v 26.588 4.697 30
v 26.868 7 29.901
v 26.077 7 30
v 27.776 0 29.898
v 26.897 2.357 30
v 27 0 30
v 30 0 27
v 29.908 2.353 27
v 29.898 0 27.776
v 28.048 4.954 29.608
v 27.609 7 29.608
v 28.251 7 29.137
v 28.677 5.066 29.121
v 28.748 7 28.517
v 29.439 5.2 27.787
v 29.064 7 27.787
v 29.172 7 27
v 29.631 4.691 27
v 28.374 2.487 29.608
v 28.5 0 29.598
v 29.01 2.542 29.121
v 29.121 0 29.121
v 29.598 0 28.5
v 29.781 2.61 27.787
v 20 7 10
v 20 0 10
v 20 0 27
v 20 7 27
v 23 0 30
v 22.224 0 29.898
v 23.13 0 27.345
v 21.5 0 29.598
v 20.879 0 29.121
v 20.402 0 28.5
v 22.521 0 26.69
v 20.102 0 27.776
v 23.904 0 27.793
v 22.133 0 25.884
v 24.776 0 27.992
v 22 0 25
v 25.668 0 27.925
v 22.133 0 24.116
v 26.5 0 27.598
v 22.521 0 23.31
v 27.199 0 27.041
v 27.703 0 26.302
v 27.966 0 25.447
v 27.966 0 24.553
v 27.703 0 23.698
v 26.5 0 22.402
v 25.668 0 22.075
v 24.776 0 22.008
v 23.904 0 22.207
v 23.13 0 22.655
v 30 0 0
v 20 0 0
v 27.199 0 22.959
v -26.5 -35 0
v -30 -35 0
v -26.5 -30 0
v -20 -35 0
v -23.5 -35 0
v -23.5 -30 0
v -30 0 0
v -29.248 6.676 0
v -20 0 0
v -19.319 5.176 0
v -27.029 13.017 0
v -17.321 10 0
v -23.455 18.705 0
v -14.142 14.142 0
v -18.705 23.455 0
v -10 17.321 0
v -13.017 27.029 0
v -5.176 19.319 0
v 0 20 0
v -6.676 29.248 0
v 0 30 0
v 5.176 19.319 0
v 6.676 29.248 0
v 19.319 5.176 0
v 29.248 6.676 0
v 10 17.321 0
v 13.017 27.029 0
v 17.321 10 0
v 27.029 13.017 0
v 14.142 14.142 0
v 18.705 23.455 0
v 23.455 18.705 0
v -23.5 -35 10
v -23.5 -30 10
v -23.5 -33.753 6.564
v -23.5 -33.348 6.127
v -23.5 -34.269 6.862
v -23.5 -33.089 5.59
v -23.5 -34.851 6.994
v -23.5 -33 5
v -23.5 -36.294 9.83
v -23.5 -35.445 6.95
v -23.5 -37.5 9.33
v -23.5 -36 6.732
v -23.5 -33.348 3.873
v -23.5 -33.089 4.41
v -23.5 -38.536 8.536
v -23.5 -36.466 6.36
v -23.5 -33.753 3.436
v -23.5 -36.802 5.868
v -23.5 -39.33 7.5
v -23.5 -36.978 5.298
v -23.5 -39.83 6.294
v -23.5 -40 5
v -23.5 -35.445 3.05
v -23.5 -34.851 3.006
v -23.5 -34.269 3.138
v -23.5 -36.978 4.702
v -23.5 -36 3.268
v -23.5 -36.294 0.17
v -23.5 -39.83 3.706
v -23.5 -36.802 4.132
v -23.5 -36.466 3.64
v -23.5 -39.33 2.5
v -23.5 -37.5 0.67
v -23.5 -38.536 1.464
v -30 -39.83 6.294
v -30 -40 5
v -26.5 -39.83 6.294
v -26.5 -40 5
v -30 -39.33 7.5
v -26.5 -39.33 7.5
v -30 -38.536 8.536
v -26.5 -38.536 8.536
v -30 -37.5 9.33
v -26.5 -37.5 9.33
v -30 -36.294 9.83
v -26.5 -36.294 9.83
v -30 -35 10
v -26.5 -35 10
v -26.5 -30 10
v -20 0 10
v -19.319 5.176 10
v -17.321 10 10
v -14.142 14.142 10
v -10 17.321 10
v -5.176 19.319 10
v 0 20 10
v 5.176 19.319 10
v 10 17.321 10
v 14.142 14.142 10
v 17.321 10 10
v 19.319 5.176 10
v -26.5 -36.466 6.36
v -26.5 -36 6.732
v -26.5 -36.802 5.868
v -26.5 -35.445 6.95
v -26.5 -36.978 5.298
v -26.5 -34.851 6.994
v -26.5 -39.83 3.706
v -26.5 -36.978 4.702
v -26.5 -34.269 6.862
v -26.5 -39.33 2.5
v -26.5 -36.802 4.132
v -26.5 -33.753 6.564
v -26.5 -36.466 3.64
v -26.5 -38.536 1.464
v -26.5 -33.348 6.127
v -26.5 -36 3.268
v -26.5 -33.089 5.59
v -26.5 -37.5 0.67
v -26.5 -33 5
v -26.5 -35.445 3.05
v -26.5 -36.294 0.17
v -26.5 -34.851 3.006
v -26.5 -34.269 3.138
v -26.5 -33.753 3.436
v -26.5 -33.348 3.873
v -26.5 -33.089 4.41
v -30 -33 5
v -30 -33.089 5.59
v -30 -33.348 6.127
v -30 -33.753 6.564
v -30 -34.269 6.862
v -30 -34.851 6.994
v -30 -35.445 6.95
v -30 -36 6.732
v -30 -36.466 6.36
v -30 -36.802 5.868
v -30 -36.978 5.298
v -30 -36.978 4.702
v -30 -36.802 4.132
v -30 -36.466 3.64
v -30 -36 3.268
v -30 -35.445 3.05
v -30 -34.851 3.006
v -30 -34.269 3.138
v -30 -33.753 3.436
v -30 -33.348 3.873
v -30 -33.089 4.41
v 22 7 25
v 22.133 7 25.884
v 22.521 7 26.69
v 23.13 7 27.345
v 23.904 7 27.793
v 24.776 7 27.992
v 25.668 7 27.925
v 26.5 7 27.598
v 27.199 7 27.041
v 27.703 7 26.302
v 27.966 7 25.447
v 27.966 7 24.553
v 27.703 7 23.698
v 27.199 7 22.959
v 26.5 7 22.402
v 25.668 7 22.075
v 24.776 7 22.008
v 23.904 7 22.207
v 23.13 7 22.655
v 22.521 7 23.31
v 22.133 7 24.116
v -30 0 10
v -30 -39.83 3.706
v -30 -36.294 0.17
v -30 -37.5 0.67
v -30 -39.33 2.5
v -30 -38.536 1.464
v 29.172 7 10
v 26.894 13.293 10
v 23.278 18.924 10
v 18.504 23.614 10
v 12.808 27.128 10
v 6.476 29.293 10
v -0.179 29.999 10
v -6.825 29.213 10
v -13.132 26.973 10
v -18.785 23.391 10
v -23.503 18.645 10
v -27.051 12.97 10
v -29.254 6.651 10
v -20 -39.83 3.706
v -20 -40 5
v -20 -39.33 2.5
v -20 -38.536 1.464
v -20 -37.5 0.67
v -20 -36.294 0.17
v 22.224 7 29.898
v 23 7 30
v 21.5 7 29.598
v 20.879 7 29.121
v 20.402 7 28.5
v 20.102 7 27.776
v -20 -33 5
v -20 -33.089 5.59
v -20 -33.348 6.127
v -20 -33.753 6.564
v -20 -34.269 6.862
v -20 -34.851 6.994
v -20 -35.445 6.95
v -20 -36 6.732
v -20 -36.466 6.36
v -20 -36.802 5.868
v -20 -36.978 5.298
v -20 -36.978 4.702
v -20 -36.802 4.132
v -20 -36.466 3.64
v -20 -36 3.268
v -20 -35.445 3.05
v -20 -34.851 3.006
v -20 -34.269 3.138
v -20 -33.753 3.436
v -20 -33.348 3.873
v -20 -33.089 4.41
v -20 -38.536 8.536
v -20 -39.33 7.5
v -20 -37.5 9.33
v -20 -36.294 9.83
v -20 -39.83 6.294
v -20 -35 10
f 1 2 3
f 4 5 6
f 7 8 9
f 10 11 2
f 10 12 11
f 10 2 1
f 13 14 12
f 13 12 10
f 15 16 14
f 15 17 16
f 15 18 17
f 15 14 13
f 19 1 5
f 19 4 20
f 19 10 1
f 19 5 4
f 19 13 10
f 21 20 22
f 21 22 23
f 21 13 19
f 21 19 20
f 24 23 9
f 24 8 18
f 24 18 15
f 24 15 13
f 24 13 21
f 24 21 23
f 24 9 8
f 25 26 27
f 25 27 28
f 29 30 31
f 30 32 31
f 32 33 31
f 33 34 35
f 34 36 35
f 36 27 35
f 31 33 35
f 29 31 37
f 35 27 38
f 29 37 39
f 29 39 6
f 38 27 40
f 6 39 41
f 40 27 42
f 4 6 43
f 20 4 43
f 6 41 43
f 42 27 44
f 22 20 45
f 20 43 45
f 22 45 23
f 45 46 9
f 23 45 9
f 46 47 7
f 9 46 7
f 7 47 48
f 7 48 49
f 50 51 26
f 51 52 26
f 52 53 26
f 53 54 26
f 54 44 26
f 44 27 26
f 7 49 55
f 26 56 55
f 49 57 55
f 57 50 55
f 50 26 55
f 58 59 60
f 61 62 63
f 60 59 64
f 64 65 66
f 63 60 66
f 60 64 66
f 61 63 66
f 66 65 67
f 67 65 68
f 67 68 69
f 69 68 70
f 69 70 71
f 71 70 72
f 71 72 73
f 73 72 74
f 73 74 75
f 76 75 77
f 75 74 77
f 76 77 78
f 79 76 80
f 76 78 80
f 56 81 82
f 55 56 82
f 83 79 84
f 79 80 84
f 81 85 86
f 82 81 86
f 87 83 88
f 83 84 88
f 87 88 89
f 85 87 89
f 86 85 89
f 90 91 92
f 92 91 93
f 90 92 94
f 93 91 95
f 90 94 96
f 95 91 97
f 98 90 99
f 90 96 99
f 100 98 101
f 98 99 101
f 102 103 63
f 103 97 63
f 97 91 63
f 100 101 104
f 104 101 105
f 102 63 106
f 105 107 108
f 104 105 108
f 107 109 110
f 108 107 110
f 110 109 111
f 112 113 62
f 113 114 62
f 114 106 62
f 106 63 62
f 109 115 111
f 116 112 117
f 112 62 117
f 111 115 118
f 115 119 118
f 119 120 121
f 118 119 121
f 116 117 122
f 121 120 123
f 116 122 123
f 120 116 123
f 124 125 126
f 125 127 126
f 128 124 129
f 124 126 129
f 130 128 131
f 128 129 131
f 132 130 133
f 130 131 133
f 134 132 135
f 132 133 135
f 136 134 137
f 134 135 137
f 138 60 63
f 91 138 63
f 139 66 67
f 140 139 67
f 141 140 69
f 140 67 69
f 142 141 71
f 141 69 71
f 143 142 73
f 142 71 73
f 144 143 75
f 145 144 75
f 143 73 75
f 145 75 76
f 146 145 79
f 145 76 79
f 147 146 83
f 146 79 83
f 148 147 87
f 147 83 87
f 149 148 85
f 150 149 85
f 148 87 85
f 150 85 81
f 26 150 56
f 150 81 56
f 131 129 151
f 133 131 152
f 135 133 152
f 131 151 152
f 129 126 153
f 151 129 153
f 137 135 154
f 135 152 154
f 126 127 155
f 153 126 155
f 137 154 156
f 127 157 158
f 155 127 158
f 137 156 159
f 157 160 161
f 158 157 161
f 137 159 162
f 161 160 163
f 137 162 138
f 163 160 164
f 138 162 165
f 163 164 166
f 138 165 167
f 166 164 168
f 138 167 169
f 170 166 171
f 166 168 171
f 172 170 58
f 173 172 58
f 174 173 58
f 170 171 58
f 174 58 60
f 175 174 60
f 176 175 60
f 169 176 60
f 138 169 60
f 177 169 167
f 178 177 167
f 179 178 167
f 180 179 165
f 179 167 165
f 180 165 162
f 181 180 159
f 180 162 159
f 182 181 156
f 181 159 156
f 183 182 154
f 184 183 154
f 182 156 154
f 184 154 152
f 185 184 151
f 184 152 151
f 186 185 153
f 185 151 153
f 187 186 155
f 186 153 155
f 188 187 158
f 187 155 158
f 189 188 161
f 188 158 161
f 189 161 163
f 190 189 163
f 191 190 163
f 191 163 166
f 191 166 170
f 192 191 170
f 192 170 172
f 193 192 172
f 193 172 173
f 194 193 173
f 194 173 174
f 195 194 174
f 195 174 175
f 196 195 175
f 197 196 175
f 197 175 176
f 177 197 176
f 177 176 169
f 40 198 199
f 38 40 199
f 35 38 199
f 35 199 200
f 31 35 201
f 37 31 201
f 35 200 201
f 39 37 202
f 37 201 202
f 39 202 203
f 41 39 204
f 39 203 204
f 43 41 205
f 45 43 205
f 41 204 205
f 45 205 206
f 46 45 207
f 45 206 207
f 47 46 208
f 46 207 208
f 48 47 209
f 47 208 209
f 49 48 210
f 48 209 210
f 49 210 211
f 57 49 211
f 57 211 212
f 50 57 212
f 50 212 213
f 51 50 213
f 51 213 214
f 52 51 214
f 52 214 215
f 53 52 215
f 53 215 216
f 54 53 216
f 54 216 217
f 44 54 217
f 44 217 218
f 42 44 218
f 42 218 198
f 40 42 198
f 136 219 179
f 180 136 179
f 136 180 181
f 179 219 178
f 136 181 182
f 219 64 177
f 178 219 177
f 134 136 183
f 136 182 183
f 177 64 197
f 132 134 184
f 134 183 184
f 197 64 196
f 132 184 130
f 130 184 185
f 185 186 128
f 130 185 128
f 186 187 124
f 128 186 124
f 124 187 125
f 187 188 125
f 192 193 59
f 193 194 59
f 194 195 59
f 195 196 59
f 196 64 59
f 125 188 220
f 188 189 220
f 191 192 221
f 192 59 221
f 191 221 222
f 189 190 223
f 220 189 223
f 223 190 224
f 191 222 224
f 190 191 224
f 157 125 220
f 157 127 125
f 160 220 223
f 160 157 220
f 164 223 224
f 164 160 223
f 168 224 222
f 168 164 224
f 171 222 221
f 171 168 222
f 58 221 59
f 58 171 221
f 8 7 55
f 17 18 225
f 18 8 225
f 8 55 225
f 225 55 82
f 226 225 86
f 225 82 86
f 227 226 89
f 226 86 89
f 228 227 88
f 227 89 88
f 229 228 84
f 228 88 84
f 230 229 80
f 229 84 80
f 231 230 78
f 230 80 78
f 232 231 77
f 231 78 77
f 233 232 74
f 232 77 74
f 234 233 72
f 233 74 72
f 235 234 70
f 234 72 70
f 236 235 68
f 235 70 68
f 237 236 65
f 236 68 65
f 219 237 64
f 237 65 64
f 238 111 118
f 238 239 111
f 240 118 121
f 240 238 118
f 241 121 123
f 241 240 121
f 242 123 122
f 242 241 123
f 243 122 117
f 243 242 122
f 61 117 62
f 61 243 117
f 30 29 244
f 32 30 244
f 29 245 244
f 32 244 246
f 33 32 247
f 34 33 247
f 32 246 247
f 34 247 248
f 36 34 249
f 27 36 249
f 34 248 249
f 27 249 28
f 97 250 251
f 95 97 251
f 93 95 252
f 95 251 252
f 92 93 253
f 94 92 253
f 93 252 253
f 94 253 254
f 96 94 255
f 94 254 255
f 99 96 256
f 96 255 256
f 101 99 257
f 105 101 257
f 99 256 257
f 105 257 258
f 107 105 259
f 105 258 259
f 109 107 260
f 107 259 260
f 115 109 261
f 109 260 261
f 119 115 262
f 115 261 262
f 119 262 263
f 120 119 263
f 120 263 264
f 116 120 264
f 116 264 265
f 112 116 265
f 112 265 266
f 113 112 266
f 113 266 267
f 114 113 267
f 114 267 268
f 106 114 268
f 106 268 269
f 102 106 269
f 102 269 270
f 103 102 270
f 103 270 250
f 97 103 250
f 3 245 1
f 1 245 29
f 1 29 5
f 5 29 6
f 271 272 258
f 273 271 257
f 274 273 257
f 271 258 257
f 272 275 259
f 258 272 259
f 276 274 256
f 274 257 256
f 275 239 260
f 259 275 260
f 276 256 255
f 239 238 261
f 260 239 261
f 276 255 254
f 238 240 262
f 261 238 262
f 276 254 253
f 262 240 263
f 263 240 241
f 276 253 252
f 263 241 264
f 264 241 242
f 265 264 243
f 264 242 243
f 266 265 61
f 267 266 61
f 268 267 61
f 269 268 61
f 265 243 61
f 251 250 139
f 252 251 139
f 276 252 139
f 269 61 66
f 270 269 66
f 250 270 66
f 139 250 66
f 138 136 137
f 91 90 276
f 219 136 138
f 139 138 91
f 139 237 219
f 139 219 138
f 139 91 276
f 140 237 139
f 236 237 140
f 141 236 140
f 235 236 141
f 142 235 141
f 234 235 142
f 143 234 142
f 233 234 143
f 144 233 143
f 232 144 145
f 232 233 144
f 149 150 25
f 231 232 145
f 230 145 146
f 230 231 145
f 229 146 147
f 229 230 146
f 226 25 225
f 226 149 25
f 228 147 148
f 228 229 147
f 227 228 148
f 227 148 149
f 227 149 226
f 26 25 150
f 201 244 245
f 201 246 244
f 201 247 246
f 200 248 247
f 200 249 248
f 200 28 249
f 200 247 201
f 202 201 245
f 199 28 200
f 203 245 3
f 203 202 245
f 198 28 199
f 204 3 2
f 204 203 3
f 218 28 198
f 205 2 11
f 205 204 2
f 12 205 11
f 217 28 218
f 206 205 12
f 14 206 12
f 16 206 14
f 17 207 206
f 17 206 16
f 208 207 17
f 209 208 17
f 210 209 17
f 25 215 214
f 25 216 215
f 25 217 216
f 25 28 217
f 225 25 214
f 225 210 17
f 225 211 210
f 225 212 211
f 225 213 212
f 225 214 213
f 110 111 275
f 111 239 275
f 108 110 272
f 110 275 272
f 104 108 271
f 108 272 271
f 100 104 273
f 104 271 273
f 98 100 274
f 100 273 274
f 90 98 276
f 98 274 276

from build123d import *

# Parameters (mm, degrees)
F1_DEPTH = 10
F2_R     = 4.99999
F3_R     = 2
F4_DEPTH = 25
F6_DEPTH = 30
F7_R     = 3
F8_R     = 3
F9_DEPTH = 25


# Not quite as in the source:
# - a fillet or chamfer is up to 0.001 mm smaller than in the source, because OpenCascade refuses the exact size


with BuildPart() as f1:
    # F0 (on Top) → F1 (new body)
    with BuildSketch(Plane.XY):
        with BuildLine():
            ThreePointArc((-20, 0), (0, 20), (20, 0))
            Line((20, 0), (30, 0))
            ThreePointArc((30, 0), (0, 30), (-30, 0))
            Line((-30, 0), (-30, -40))
            Line((-30, -40), (-26.5, -40))
            Line((-26.5, -40), (-26.5, -30))
            Line((-26.5, -30), (-23.5, -30))
            Line((-23.5, -30), (-23.5, -40))
            Line((-23.5, -40), (-20, -40))
            Line((-20, -40), (-20, 0))
        make_face()
    extrude(amount=F1_DEPTH)

    # F2 (radius 5 in the source; OpenCascade refuses exactly that, so slightly less here)
    f2_edges = [f1.edges().sort_by_distance(p)[0] for p in [
        (-28.25, -40, 10),
        (-28.25, -40, 0),
        (-21.75, -40, 10),
        (-21.75, -40, 0),
    ]]
    fillet(f2_edges, radius=F2_R)

    # F3 (on face) → F4 (cut)
    with BuildSketch(Plane.YZ.offset(-20)):
        with Locations((-35, 5)):
            Circle(F3_R)
    extrude(amount=-F4_DEPTH, mode=Mode.SUBTRACT)

    # F5 (on face) → F6 (join)
    with BuildSketch(Plane(origin=(0, 0, 0), x_dir=(1, 0, 0), z_dir=(0, 0, -1))):
        with BuildLine():
            ThreePointArc((29.1719042916, -7), (29.7922567855, -3.5244057124), (30, 0))
            Line((30, 0), (20, 0))
            Line((20, 0), (20, -7))
            Line((20, -7), (29.1719042916, -7))
        make_face()
    extrude(amount=-F6_DEPTH)

    # F7
    f7_edges = [f1.edges().sort_by_distance(p)[0] for p in [
        (29.792257, 3.524406, 30),
        (20, 3.5, 30),
    ]]
    fillet(f7_edges, radius=F7_R)

    # F8 (on face) → F9 (cut)
    with BuildSketch(Plane(origin=(0, 7, 0), x_dir=(-1, 0, 0), z_dir=(0, 1, 0))):
        with Locations((-25, 25)):
            Circle(F8_R)
    extrude(amount=-F9_DEPTH, mode=Mode.SUBTRACT)


solid = f1.part
